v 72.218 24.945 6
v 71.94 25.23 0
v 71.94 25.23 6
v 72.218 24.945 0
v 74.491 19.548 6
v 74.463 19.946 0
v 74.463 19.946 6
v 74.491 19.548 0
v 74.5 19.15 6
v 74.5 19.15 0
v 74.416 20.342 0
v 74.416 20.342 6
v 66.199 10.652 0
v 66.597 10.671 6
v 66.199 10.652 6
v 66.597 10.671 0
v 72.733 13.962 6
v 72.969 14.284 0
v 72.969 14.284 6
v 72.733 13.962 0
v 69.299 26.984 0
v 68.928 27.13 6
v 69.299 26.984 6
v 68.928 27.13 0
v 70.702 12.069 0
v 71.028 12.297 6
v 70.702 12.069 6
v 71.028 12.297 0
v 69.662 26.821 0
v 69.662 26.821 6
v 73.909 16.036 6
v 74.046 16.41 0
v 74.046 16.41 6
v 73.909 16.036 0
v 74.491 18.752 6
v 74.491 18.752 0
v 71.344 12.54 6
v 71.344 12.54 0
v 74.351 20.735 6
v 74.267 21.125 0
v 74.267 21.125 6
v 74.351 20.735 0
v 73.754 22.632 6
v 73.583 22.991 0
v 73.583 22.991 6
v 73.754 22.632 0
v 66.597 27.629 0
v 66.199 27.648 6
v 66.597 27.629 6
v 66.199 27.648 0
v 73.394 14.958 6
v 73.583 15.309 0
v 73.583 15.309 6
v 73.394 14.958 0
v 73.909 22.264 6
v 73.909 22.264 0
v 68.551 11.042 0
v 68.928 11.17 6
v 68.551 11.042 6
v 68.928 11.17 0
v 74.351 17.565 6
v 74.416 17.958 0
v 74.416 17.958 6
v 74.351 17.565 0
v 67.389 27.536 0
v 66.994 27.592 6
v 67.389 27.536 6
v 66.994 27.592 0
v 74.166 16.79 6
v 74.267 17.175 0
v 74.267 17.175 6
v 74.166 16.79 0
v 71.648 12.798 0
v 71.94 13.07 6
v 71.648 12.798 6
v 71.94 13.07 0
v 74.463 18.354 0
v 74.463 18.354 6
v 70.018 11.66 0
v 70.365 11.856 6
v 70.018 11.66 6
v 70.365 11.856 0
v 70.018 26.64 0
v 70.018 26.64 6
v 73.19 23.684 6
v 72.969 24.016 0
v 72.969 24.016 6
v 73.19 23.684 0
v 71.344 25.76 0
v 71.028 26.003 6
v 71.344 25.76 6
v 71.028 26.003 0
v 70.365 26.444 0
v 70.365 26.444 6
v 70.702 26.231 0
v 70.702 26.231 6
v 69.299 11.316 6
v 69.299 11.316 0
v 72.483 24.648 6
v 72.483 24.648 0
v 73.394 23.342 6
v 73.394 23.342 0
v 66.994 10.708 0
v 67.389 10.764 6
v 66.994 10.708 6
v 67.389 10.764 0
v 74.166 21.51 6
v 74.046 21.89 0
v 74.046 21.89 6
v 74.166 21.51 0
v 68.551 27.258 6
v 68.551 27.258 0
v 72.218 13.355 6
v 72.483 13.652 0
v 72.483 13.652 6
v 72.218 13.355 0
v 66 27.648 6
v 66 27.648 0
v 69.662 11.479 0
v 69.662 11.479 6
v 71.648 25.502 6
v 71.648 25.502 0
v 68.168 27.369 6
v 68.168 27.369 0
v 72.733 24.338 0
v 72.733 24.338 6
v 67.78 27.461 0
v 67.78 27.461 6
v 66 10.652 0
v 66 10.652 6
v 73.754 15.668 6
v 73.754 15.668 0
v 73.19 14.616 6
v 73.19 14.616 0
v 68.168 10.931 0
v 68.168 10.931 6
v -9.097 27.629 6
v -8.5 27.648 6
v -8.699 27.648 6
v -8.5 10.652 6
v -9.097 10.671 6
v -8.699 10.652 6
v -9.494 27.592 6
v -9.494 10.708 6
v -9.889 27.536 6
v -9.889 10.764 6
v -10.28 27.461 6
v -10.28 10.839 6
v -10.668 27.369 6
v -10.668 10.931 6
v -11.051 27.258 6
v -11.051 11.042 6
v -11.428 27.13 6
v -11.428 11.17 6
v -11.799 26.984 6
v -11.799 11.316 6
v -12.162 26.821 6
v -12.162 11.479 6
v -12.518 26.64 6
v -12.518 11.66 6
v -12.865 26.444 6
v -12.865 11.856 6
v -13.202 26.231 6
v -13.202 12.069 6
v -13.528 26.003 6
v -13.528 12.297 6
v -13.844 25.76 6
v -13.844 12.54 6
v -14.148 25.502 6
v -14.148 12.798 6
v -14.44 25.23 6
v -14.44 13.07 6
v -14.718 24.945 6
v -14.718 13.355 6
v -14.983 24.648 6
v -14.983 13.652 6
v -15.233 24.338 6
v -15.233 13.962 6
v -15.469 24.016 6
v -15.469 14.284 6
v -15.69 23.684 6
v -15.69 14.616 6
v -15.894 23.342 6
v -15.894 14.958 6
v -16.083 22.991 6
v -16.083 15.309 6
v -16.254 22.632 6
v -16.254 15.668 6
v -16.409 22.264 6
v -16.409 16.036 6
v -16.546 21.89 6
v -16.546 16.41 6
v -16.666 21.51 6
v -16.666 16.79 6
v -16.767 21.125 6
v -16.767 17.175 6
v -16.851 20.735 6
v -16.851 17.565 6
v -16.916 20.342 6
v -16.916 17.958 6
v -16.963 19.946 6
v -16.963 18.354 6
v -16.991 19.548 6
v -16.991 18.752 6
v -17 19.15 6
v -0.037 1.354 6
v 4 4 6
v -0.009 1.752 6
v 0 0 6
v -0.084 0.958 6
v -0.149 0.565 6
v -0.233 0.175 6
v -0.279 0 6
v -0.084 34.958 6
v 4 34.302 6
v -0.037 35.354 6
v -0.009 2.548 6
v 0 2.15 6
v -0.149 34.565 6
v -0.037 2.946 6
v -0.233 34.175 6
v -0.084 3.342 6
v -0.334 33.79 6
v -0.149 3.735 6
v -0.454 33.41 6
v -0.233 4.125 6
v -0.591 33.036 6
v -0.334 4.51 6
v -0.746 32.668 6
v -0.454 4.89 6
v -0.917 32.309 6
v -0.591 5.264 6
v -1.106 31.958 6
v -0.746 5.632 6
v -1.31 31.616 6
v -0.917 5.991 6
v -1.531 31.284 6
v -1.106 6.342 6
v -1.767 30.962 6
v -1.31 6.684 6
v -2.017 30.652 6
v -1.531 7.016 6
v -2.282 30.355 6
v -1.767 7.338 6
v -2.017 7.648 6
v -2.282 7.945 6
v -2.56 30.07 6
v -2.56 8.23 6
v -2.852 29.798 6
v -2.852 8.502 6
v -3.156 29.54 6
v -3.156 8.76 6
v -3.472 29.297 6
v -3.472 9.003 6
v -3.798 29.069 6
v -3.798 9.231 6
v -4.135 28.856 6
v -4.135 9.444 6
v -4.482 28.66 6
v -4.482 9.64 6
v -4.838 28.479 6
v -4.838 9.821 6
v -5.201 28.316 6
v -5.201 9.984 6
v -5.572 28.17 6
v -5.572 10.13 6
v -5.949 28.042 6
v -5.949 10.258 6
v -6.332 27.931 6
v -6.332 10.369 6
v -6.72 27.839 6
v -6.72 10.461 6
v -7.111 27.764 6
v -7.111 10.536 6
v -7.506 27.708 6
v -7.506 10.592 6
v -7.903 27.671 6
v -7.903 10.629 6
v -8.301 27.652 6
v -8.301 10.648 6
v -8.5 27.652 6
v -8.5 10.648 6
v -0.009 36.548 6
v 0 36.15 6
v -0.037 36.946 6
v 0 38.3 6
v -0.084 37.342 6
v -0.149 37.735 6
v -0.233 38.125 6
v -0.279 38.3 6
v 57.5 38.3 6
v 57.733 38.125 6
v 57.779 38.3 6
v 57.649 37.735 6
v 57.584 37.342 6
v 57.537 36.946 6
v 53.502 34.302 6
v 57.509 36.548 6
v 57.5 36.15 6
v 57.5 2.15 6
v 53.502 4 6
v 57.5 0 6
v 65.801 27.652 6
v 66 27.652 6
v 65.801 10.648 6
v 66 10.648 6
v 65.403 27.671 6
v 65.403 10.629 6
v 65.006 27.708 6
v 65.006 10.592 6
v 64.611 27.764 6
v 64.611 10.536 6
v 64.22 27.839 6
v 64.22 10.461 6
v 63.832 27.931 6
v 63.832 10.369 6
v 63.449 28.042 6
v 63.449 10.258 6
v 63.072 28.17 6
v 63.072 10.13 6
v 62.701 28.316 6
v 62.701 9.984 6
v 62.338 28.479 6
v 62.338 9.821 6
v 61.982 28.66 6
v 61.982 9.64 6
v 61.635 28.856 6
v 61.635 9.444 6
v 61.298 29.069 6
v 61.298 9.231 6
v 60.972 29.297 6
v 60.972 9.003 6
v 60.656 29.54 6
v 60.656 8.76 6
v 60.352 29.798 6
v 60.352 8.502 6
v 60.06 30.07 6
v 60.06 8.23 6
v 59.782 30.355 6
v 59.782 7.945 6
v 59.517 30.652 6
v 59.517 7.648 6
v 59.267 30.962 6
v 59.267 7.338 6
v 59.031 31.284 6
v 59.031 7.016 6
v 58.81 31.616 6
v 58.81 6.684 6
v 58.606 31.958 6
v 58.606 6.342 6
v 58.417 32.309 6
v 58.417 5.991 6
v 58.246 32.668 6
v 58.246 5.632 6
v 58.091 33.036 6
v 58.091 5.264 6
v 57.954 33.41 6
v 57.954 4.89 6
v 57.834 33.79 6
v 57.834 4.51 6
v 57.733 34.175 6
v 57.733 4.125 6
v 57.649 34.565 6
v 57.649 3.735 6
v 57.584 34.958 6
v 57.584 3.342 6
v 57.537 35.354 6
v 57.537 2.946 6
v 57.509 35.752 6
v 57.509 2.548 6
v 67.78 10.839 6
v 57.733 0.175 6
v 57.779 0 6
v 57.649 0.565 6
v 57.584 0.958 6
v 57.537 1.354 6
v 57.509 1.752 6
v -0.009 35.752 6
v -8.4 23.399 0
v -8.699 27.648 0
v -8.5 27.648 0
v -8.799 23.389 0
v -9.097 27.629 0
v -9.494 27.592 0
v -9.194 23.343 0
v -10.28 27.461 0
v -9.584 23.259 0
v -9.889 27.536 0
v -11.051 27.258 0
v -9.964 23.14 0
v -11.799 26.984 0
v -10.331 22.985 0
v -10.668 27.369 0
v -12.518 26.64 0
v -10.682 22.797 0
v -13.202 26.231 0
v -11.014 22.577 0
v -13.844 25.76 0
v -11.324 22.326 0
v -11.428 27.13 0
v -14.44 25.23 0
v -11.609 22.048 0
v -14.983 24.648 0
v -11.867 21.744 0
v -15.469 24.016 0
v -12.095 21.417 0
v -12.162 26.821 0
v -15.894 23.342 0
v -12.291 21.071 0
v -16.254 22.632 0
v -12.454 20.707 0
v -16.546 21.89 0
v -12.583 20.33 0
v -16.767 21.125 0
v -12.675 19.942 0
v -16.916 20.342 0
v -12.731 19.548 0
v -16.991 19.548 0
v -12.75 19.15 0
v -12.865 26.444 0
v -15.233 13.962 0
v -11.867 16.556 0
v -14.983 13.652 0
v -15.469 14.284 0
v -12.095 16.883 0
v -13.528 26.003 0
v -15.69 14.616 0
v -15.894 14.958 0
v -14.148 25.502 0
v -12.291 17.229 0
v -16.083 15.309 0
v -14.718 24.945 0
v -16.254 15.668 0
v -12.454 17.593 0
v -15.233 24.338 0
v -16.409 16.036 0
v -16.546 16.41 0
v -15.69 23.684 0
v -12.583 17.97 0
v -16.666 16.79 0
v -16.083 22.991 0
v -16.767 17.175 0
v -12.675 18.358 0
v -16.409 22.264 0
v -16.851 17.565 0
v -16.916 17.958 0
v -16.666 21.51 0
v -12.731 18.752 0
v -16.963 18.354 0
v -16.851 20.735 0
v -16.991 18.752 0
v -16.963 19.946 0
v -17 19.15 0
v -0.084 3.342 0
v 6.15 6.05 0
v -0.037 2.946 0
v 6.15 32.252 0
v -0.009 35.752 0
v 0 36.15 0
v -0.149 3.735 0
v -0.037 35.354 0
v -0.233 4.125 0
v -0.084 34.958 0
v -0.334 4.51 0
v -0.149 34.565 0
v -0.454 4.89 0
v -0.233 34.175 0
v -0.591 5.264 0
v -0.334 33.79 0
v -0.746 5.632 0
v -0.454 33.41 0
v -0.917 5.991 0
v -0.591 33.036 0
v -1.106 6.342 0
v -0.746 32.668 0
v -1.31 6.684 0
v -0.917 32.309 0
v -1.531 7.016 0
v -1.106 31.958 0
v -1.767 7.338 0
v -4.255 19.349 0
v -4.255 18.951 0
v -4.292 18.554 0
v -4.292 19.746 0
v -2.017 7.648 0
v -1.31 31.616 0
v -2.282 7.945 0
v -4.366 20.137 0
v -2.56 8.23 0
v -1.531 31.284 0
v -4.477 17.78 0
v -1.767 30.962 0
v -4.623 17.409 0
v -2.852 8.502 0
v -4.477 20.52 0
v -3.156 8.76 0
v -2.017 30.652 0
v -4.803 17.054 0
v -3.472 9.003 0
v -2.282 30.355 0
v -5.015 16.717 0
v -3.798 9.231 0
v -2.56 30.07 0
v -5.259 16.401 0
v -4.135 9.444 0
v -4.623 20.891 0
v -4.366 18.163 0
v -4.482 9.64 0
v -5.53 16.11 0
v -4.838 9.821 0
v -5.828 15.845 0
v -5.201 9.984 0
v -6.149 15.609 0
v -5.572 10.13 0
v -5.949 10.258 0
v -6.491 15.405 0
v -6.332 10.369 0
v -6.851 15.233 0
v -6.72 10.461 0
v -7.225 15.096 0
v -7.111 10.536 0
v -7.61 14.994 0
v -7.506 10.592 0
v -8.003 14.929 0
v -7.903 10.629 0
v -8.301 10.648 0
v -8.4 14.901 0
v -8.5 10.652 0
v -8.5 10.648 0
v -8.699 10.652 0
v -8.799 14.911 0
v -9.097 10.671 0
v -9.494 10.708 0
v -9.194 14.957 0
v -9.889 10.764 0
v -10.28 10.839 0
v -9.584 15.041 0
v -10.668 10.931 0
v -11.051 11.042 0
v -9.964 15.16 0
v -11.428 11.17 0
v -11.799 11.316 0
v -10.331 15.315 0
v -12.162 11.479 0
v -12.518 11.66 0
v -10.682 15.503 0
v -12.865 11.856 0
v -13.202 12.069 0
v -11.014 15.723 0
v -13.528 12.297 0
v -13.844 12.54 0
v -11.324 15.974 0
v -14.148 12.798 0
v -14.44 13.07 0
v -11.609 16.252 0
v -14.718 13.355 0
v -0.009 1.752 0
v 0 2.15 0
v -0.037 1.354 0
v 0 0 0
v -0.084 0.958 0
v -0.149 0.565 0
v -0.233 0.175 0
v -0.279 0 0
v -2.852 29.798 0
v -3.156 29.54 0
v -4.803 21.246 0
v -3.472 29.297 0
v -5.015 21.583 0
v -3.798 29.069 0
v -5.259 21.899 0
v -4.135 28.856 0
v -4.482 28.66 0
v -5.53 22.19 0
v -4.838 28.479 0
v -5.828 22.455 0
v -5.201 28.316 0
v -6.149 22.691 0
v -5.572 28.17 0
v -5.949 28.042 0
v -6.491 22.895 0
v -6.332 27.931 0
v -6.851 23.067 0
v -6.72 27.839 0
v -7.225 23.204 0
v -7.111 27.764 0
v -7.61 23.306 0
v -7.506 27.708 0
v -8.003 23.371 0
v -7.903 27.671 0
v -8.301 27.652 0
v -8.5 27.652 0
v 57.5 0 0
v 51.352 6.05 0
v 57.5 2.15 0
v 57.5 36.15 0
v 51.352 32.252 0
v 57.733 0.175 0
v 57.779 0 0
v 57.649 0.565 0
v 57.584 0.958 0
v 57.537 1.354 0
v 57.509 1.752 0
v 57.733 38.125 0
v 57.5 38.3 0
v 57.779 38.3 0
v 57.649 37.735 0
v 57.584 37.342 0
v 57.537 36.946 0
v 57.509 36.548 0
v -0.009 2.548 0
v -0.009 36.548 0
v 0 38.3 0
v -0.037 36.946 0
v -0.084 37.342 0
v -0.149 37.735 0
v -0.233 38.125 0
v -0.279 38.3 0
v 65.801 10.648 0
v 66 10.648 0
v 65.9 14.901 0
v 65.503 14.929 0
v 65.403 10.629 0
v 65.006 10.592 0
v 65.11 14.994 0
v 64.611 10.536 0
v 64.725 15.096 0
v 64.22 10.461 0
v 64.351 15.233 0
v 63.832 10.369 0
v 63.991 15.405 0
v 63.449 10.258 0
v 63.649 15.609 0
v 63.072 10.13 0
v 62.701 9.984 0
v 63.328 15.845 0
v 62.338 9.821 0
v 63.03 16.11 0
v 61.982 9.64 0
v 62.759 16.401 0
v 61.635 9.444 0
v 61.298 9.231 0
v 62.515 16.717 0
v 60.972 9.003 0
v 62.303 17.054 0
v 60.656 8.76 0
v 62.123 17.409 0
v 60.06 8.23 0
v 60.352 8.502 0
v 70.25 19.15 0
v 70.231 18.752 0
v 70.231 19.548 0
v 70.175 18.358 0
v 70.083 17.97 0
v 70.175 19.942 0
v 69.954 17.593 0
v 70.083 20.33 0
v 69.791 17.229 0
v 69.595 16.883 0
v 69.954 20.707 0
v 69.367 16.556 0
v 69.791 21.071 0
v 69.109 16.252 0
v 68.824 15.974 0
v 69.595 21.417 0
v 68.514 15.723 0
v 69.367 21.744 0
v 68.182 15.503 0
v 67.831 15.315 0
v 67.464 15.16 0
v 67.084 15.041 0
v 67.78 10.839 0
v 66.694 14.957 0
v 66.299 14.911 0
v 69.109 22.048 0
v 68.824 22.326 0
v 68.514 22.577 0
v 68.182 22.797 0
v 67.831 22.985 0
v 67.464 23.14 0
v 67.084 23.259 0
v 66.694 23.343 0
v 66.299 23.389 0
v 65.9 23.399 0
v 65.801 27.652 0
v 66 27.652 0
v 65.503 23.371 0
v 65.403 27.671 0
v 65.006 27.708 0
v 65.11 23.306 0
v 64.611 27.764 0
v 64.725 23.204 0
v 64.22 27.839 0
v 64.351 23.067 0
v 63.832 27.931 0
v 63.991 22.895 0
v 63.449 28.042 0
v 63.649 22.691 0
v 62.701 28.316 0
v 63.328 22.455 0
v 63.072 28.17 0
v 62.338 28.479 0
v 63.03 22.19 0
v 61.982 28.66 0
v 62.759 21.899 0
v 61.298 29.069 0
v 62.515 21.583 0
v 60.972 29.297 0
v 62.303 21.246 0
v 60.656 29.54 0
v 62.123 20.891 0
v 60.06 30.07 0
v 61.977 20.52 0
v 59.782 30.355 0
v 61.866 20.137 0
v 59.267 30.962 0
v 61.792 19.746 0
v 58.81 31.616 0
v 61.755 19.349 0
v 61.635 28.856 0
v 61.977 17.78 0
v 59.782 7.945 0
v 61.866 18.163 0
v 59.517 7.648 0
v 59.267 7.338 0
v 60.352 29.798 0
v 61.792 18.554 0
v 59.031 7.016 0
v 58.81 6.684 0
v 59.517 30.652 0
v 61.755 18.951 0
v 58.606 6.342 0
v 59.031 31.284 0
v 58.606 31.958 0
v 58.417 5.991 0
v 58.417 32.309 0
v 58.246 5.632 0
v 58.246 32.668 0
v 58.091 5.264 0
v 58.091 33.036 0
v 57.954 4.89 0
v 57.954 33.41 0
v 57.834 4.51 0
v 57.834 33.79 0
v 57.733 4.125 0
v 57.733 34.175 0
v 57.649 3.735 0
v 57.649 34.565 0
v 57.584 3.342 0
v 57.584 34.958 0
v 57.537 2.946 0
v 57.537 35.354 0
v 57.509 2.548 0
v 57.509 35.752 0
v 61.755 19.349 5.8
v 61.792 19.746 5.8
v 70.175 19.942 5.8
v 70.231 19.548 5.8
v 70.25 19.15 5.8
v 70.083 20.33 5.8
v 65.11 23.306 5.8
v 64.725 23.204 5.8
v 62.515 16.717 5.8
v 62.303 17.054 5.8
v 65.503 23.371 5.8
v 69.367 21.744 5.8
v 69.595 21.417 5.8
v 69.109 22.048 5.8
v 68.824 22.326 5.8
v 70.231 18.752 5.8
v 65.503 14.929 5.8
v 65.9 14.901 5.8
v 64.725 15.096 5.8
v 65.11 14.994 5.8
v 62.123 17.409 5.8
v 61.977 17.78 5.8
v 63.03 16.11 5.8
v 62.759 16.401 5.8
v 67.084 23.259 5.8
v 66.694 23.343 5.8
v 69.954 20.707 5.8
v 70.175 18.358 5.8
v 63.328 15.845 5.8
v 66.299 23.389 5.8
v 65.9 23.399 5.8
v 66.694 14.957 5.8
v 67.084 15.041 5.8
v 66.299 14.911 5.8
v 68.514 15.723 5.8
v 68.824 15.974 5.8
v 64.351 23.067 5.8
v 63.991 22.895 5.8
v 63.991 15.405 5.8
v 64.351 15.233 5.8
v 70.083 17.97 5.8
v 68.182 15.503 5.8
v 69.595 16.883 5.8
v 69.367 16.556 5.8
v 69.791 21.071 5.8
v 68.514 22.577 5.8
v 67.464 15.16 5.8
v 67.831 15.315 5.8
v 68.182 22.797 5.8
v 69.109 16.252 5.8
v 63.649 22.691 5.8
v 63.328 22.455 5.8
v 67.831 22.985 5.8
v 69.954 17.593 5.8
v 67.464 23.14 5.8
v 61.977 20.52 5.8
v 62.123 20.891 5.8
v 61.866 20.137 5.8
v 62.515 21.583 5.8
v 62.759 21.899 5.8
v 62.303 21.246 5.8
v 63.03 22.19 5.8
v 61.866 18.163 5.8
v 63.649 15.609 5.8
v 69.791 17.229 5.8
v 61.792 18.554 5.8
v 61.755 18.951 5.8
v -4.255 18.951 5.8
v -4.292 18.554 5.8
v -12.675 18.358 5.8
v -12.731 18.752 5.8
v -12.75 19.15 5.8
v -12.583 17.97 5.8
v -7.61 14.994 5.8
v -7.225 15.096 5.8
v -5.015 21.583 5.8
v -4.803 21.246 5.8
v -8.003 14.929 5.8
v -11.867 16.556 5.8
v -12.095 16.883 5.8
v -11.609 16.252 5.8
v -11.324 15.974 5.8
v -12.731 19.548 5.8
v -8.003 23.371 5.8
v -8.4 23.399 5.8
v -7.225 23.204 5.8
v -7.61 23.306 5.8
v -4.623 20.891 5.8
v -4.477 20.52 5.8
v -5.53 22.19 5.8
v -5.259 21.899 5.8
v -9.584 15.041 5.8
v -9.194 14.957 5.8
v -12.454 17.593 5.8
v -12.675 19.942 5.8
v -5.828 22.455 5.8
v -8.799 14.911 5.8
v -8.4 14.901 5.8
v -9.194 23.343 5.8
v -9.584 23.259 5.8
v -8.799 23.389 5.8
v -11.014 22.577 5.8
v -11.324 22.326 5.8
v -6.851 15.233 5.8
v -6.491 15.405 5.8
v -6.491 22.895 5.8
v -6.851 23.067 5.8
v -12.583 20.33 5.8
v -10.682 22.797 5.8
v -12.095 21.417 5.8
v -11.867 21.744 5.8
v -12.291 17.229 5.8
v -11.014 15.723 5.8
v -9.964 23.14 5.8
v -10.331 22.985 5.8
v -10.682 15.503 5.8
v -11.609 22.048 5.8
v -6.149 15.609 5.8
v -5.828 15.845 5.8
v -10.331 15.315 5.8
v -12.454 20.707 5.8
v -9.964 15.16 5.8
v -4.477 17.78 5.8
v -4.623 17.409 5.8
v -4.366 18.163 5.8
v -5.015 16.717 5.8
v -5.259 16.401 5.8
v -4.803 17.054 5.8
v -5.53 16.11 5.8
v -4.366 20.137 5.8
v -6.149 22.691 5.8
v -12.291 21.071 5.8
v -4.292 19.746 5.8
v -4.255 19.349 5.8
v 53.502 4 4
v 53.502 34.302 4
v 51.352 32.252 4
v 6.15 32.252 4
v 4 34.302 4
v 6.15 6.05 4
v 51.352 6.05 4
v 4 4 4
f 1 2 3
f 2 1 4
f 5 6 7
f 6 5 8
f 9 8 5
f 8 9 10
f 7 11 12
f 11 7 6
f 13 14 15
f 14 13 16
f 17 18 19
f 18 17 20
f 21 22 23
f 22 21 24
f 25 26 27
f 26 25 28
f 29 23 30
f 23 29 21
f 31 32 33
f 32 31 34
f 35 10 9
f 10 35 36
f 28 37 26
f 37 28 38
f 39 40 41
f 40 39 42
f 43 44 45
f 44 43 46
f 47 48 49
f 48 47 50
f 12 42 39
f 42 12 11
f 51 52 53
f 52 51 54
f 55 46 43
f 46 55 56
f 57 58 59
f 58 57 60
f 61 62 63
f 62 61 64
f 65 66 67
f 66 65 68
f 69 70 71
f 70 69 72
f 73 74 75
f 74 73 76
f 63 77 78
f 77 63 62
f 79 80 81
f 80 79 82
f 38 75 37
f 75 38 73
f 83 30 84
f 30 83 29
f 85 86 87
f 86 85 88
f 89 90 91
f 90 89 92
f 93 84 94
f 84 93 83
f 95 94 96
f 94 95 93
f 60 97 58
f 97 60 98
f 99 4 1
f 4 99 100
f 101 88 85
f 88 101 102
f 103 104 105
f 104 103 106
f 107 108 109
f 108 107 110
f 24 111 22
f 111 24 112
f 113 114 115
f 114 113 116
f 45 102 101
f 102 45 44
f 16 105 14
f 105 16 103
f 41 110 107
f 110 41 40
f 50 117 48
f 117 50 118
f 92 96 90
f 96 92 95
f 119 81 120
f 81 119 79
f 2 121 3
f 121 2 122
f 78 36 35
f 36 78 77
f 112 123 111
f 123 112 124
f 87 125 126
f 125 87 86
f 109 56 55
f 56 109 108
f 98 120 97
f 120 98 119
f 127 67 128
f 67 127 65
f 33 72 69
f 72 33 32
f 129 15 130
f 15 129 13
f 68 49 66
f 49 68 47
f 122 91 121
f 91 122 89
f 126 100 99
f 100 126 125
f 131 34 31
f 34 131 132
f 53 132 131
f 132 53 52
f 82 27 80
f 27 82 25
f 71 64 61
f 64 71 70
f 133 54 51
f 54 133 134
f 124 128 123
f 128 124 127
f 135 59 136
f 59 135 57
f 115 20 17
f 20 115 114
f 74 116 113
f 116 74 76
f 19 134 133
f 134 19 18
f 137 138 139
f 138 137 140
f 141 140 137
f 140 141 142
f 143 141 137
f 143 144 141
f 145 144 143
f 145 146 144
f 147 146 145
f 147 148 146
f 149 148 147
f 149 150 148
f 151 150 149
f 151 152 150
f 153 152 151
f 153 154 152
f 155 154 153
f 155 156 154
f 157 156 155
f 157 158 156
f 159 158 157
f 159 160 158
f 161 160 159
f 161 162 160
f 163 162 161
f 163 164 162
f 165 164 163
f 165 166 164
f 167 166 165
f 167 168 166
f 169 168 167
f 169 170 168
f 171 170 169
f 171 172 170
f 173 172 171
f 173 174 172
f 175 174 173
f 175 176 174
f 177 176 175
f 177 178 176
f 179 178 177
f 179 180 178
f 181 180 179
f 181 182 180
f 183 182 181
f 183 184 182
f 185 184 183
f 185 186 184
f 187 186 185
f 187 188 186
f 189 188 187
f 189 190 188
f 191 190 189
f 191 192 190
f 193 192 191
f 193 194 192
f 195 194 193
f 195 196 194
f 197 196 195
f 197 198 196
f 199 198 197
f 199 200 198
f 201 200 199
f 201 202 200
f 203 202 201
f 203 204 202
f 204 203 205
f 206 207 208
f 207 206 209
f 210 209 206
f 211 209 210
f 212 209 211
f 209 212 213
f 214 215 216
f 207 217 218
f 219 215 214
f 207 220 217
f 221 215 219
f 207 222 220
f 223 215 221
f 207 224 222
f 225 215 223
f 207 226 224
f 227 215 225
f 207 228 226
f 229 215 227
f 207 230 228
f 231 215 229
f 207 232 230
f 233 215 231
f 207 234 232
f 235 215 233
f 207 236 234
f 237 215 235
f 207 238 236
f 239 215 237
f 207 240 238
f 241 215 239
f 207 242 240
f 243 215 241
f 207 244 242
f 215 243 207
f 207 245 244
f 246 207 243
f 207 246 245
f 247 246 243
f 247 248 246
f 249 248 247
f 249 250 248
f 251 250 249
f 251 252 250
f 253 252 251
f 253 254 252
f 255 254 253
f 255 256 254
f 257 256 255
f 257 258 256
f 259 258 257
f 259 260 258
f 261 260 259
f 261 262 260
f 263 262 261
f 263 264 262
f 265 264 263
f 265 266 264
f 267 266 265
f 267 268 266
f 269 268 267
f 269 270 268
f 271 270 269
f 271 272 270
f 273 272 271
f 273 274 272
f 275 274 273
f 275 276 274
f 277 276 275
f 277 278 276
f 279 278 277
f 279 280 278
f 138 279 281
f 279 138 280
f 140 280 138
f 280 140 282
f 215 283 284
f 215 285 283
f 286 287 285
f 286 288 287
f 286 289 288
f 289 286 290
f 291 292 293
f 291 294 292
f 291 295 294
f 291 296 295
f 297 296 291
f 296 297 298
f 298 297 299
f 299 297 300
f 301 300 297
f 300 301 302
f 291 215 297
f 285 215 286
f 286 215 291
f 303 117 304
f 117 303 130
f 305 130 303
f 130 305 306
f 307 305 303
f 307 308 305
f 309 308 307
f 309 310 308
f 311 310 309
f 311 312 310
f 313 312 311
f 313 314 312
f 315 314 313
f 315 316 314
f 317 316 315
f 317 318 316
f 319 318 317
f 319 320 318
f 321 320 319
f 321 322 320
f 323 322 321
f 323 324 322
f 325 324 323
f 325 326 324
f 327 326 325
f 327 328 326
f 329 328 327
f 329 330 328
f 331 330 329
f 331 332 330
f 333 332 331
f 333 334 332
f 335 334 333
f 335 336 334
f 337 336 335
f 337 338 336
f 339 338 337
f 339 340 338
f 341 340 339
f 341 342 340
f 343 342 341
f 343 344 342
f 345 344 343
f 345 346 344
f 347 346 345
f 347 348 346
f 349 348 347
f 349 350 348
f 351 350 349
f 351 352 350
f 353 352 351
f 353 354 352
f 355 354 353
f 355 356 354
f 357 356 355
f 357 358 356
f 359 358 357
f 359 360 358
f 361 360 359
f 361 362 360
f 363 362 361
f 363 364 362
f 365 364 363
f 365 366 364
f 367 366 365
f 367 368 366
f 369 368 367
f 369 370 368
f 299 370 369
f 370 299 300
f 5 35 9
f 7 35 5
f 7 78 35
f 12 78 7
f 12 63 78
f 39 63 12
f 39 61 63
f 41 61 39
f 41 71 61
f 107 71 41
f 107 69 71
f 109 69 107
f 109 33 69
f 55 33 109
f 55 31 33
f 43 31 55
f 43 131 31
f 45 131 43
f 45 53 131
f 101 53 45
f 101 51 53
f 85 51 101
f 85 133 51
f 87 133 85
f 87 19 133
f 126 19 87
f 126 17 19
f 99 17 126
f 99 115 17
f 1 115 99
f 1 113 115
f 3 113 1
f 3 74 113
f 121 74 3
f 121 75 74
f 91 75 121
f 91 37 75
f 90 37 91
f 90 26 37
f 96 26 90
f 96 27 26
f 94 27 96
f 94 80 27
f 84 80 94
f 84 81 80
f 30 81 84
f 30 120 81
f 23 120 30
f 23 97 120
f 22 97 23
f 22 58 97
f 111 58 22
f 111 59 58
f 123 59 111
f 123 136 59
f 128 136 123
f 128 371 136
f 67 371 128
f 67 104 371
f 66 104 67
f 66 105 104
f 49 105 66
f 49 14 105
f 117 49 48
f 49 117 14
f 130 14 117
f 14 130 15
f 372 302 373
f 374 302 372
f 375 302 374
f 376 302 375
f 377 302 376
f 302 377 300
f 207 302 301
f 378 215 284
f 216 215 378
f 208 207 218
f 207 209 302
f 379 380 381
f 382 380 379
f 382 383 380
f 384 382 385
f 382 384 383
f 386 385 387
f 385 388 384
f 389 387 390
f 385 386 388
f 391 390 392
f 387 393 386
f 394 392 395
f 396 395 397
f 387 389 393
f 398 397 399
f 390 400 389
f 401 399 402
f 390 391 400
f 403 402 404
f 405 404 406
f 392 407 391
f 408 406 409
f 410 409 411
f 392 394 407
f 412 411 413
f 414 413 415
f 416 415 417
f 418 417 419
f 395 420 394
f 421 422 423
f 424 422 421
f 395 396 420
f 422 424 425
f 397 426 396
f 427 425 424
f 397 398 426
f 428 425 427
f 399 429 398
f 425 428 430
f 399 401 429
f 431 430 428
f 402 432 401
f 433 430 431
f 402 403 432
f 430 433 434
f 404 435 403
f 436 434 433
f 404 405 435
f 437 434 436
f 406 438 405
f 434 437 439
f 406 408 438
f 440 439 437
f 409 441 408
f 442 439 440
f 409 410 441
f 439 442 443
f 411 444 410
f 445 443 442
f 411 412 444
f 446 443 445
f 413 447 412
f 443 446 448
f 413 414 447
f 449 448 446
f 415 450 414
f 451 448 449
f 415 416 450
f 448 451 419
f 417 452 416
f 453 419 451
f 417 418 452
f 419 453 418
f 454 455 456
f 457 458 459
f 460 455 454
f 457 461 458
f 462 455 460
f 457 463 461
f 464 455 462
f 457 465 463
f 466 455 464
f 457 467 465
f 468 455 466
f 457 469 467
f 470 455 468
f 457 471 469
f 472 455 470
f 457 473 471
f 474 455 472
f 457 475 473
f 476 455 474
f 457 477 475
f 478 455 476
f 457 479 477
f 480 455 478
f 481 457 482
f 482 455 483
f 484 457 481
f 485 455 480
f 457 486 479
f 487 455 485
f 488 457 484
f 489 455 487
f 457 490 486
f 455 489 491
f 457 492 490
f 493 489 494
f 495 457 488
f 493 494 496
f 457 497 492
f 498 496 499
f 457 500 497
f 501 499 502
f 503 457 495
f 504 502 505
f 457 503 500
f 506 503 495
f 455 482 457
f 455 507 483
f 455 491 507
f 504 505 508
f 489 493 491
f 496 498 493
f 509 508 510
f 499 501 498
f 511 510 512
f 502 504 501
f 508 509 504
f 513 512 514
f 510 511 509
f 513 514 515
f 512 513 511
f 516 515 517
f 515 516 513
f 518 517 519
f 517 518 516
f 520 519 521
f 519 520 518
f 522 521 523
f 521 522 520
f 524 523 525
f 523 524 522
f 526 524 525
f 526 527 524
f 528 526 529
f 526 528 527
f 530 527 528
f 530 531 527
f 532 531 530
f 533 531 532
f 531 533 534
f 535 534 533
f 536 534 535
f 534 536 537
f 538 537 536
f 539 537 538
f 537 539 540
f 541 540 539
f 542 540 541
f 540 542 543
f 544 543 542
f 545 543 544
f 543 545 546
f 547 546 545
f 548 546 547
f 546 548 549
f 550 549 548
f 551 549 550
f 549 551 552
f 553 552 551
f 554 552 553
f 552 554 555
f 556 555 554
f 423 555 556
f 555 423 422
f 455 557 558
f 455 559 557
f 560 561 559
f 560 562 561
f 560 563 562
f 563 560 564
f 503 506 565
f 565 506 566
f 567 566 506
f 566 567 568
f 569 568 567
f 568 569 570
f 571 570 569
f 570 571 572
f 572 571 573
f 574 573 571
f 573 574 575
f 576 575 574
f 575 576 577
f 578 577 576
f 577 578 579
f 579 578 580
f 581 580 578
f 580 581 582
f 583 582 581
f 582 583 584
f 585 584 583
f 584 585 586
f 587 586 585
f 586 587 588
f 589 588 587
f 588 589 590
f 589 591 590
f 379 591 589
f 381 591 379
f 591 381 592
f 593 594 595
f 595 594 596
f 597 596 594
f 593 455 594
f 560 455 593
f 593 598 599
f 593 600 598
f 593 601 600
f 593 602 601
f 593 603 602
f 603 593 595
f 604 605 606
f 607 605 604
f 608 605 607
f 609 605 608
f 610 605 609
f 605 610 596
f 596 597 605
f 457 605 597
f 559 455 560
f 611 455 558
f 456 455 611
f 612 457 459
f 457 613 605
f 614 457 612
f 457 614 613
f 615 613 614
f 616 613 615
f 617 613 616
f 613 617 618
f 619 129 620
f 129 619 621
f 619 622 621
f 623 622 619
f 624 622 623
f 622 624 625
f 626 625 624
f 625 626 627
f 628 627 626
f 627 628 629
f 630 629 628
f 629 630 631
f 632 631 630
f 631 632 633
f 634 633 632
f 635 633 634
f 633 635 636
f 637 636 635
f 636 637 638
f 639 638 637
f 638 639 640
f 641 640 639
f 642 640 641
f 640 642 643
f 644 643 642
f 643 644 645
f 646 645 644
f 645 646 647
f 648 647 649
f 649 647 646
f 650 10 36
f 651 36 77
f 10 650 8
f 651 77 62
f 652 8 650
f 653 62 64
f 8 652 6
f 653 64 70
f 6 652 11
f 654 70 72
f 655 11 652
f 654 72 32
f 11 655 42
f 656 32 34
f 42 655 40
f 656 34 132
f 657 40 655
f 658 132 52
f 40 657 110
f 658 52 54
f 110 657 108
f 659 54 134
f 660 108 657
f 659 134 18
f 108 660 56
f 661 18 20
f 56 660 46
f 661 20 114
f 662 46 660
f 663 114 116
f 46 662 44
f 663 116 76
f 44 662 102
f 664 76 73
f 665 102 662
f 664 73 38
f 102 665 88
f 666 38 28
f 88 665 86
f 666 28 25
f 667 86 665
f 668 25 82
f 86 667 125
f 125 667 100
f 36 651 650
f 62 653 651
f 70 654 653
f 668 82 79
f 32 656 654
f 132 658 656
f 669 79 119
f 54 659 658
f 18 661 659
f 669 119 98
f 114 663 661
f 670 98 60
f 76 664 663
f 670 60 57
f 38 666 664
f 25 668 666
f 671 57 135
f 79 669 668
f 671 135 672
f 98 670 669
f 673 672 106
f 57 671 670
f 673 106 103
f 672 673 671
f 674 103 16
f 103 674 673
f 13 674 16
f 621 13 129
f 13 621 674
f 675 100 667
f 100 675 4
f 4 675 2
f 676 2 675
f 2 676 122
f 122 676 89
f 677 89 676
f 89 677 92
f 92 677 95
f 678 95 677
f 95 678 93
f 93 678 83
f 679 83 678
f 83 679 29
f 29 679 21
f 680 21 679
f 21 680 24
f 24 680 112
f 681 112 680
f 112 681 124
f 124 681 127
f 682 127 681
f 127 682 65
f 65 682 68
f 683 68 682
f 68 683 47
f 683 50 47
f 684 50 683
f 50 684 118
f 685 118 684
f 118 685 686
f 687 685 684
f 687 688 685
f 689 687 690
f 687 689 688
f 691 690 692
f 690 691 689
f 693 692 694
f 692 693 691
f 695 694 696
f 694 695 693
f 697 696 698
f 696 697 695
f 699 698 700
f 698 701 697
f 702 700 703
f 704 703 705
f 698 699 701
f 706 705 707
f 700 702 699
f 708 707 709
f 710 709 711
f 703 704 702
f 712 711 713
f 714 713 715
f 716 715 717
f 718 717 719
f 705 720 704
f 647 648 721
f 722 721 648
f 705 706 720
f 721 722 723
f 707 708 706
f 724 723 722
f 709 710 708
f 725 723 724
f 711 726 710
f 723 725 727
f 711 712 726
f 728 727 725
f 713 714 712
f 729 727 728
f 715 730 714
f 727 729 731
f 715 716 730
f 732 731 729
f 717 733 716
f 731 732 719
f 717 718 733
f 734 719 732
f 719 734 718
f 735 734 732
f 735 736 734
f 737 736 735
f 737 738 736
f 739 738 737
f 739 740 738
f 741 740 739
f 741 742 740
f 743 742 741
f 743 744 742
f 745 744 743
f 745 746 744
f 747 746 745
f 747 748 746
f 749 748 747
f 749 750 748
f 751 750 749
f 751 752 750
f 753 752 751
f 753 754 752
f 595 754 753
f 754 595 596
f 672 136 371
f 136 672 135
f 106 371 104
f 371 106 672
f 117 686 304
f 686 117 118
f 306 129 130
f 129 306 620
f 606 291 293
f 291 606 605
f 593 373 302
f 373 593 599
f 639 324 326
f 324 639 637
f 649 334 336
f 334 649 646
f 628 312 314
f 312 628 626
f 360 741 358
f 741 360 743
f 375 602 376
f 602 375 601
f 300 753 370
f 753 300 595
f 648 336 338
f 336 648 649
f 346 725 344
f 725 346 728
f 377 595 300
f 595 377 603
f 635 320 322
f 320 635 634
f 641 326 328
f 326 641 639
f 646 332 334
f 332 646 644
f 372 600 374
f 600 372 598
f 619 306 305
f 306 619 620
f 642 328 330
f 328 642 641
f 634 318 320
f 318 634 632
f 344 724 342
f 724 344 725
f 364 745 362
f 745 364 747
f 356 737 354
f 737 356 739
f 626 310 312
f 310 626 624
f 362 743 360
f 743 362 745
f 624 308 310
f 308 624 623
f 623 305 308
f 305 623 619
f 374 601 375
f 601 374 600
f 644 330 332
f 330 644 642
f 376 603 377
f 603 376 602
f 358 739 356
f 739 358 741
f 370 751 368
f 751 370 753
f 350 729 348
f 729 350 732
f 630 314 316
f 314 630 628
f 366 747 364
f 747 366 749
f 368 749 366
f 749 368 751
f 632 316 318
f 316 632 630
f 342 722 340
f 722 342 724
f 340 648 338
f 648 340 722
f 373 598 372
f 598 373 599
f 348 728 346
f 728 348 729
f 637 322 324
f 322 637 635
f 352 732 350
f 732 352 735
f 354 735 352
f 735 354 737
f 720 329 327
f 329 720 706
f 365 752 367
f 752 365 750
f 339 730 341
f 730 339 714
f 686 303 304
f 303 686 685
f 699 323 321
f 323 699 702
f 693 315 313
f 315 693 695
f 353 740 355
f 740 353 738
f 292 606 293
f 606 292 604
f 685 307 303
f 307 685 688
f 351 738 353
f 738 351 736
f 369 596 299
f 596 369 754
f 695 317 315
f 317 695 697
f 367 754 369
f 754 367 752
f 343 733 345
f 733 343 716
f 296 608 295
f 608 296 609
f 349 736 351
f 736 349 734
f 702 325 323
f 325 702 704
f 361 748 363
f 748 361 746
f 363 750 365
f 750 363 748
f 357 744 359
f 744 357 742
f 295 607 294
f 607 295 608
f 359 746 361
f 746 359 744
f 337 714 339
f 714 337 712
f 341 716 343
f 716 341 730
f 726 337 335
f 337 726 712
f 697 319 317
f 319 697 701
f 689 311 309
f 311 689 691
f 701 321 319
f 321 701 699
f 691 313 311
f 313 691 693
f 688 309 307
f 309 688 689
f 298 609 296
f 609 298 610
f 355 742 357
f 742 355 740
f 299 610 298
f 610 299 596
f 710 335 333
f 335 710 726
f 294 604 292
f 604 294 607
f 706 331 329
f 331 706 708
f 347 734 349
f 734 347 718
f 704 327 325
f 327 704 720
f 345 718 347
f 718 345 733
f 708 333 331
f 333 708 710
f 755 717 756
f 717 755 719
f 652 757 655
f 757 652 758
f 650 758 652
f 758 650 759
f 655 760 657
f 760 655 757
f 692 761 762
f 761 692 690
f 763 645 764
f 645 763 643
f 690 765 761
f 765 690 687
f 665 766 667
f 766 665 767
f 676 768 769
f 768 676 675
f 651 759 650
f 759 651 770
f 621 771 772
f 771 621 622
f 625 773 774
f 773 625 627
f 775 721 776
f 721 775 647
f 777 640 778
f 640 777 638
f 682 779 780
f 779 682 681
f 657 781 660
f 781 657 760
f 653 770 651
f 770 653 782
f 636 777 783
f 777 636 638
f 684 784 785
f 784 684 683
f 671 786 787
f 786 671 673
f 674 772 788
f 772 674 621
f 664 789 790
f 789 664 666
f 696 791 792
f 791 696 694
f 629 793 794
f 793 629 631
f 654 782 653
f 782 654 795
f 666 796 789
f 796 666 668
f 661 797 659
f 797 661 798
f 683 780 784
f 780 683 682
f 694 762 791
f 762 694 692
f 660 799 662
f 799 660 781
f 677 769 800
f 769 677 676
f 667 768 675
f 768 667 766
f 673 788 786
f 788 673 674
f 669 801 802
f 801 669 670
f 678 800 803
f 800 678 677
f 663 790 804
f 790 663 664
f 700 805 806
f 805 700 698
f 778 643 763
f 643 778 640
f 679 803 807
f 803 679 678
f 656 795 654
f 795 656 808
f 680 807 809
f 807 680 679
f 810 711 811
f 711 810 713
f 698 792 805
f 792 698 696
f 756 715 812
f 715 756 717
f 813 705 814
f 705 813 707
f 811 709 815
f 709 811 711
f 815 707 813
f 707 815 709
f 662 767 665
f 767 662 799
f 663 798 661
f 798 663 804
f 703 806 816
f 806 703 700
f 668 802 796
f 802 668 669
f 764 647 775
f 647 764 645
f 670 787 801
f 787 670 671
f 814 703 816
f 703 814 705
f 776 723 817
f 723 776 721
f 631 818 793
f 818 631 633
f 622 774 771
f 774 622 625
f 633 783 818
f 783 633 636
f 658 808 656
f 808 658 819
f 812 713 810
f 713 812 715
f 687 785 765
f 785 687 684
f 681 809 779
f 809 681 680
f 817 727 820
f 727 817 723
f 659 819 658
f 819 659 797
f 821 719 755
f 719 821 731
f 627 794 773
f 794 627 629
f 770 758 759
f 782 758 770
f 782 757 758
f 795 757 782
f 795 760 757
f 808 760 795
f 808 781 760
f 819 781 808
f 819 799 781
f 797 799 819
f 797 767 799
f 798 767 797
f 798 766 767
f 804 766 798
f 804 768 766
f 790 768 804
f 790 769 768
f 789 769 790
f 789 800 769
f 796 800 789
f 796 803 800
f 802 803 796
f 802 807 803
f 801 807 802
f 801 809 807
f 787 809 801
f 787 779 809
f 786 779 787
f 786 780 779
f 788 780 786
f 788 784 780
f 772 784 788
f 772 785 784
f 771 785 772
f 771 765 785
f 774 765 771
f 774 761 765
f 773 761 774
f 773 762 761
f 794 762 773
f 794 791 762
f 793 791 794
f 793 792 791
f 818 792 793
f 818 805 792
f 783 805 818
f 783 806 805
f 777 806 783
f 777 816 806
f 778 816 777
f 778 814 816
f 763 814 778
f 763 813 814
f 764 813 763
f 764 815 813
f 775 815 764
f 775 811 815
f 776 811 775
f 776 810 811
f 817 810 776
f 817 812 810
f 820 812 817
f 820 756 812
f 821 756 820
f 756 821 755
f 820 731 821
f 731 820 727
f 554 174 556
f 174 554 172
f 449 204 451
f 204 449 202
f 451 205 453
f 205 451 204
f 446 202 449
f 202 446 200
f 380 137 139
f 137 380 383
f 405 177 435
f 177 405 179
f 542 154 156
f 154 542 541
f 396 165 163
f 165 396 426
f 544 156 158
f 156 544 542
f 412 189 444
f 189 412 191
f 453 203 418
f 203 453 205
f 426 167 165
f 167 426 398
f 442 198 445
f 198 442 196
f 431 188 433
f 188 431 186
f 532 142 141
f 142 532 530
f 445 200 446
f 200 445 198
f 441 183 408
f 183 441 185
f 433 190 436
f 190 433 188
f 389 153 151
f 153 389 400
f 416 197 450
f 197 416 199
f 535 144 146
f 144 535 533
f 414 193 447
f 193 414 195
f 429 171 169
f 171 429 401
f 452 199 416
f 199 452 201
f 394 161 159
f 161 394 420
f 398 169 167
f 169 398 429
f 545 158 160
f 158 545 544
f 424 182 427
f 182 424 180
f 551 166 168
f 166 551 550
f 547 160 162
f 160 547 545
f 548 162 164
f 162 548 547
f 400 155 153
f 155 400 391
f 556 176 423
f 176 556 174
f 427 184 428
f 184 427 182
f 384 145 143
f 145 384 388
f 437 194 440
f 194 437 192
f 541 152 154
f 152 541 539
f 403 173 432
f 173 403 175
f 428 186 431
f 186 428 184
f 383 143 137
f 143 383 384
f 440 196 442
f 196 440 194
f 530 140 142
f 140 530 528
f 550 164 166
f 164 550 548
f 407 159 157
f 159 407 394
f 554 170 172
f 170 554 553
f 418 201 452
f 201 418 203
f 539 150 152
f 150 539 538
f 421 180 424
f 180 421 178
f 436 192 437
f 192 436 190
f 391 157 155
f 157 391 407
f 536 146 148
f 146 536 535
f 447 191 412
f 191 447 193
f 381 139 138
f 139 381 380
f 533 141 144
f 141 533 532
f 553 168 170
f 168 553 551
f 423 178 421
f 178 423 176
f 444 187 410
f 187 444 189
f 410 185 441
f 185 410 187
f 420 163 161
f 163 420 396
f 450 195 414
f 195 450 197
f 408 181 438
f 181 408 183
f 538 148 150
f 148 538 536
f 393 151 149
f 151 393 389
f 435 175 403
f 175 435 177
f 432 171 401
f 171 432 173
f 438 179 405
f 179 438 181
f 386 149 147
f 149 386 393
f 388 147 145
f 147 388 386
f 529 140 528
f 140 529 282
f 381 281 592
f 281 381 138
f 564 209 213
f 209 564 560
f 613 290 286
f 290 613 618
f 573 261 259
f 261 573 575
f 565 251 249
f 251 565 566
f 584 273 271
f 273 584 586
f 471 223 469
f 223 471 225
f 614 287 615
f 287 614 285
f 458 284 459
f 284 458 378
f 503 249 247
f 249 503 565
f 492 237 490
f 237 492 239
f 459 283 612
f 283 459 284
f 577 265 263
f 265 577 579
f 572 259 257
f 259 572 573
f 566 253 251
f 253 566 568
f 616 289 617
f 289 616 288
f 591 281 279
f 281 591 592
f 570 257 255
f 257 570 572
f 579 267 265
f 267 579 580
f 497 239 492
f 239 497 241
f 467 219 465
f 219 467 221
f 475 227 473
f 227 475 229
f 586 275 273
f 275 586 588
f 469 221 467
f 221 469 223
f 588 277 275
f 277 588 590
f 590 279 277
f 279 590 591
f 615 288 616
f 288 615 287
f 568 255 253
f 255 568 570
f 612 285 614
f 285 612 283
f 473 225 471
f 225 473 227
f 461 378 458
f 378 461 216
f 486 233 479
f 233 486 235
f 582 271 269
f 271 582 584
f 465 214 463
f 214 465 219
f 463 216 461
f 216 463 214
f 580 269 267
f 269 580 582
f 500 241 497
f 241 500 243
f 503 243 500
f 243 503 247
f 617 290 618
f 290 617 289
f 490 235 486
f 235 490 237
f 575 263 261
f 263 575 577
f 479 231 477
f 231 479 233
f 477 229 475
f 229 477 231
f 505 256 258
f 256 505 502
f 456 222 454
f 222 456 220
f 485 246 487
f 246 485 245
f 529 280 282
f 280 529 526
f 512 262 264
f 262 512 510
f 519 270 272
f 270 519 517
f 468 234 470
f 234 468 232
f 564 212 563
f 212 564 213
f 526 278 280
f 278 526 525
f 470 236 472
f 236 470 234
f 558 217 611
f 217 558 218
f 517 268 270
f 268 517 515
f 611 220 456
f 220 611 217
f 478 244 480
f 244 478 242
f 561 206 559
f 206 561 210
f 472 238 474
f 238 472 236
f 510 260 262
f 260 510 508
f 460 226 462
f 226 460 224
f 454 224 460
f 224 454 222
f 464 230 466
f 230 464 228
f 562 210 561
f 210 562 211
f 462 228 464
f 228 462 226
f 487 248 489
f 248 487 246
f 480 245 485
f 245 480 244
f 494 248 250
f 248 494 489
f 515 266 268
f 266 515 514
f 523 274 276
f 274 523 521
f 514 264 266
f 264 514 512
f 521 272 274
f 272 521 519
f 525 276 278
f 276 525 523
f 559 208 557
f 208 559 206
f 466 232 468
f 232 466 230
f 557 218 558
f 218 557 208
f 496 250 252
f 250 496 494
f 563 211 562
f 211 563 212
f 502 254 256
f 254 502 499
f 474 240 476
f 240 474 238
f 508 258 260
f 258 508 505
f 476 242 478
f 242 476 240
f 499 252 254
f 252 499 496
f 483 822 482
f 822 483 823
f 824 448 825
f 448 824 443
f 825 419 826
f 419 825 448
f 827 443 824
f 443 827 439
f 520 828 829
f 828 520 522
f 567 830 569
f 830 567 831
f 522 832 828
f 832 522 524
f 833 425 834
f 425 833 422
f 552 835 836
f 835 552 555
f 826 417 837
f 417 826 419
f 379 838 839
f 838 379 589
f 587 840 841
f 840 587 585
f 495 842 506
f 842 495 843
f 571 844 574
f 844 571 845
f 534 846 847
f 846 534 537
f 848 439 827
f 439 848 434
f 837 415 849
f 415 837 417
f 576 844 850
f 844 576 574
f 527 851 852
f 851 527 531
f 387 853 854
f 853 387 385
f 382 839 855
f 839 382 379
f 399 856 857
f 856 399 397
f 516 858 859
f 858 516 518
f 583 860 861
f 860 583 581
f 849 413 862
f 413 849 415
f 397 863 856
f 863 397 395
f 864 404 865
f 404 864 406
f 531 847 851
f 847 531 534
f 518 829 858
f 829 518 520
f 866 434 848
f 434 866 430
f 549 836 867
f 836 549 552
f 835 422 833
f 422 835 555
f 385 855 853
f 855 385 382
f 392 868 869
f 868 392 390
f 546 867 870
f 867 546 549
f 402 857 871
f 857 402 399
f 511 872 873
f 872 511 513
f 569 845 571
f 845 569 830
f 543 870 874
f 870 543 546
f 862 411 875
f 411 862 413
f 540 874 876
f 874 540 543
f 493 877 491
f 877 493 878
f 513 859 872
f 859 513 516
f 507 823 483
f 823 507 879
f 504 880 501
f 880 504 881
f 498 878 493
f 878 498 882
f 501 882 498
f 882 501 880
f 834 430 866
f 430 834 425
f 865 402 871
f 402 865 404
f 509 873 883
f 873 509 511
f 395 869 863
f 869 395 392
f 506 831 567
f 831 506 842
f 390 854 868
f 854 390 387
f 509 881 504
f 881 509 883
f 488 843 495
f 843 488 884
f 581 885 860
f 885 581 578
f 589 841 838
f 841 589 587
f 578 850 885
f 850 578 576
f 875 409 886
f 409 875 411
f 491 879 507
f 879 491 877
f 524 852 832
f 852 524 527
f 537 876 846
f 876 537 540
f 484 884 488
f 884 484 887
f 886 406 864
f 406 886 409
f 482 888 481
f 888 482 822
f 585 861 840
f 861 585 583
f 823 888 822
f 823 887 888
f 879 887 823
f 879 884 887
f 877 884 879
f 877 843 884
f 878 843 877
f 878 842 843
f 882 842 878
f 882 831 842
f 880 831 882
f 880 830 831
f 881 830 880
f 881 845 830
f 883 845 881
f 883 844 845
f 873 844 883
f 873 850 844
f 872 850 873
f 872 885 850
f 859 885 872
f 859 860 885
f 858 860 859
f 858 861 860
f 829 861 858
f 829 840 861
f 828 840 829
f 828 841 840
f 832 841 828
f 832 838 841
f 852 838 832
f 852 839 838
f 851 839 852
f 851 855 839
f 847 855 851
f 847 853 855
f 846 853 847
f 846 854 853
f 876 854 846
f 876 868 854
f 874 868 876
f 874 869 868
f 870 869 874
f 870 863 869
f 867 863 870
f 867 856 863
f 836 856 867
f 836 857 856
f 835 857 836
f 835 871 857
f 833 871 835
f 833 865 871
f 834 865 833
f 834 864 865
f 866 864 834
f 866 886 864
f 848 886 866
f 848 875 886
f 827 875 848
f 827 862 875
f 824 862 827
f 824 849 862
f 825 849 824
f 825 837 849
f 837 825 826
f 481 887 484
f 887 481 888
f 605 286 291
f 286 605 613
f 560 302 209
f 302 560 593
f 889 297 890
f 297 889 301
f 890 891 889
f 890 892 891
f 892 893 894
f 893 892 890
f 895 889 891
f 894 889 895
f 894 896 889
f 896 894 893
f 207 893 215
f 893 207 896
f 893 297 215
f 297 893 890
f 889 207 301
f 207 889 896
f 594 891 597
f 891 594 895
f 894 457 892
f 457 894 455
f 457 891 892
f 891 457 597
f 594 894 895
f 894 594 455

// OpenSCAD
$fa = 2;    // minimum angle (fine resolution)
$fs = 0.4;  // minimum size (fine resolution)

module cube_filleted_columns(x,y,z,r) {
  if (is_list(x) && is_num(y)) {   // also accepts cube_filleted_columns (vector, r)
    cube_filleted_columns(x.x, x.y, x.z, y);
  } else {
    union () {
      translate ([r,  r,  0]) cylinder(h=z, r=r);
      translate ([x-r,r,  0]) cylinder(h=z, r=r);
      translate ([r,  y-r,0]) cylinder(h=z, r=r);
      translate ([x-r,y-r,0]) cylinder(h=z, r=r);

      translate([r,     0,  0])  cube([x-2*r, 2*r, z]);
      translate([r, y-2*r,  0])  cube([x-2*r, 2*r, z]);

      translate([0,     r,  0])  cube([2*r, y-2*r, z]);
      translate([x-2*r, r,  0])  cube([2*r, y-2*r, z]);

      translate([r, r, 0]) cube([x-2*r,y-2*r,z]);
    }
  }
}



epsilon = 0.001;   // help avoid issues with floating-point rounding error
eps_vector = [epsilon, epsilon, epsilon];

layer_height = 0.2;

frame = [49.5, 30.3, 2.0]; // frame around the front with 1mm clearance
grip  = [45.2, 26.2, 4.0];    // grips the hygrometer tightly
frame_wrap = 4; // distance from edge of frame to edge of block
block = [frame.x + 2 * frame_wrap, frame.y + 2 * frame_wrap, frame.z + grip.z];


magnet_diameter = 8.5;  // diameter for pocket, not magnet itself
magnet_thickness = 2.0;
magnet_sep_layers = 1;   // how many layers separate the magnet from the front of the panel?
magnet_separator = magnet_sep_layers * layer_height; 
                         // thickness of panel separating magnet from front

module magnet_wing(glue, thickness = block.z) {
   // origin at center of magnet pocket
  difference () {
    union () {
      cylinder(r = magnet_diameter, h = thickness);
      translate([-magnet_diameter, -block.y/2, 0])
        cube([magnet_diameter, block.y, thickness]);
    }
    translate([0, -2*magnet_diameter, -epsilon])
      cylinder(r = magnet_diameter, h = thickness + 2*epsilon);
    translate([0,  2*magnet_diameter, -epsilon])
      cylinder(r = magnet_diameter, h = thickness + 2*epsilon);
    if (glue) {
      error("glue not implemented here");
    } else {
      translate([0,0,-thickness-magnet_separator])
        cylinder(d = magnet_diameter, h = 2 * thickness);
    }      
  }
}

module holder (glue=false) {
  difference () {
    union () {
      cube(block);
      translate([block.x + magnet_diameter, block.y/2, 0]) magnet_wing(glue=glue);
      translate([        - magnet_diameter, block.y/2, 0])
        rotate([0,0,180]) magnet_wing(glue=glue);
    }
    translate([frame_wrap, frame_wrap, grip.z])
      union () {
        cube(frame + 2 * eps_vector);
        translate((frame - grip) / 2)
          translate([0,0,-block.z/2-epsilon]) cube(grip + 2 * eps_vector);
    }
  }
}

holder();

//magnet_wing();
